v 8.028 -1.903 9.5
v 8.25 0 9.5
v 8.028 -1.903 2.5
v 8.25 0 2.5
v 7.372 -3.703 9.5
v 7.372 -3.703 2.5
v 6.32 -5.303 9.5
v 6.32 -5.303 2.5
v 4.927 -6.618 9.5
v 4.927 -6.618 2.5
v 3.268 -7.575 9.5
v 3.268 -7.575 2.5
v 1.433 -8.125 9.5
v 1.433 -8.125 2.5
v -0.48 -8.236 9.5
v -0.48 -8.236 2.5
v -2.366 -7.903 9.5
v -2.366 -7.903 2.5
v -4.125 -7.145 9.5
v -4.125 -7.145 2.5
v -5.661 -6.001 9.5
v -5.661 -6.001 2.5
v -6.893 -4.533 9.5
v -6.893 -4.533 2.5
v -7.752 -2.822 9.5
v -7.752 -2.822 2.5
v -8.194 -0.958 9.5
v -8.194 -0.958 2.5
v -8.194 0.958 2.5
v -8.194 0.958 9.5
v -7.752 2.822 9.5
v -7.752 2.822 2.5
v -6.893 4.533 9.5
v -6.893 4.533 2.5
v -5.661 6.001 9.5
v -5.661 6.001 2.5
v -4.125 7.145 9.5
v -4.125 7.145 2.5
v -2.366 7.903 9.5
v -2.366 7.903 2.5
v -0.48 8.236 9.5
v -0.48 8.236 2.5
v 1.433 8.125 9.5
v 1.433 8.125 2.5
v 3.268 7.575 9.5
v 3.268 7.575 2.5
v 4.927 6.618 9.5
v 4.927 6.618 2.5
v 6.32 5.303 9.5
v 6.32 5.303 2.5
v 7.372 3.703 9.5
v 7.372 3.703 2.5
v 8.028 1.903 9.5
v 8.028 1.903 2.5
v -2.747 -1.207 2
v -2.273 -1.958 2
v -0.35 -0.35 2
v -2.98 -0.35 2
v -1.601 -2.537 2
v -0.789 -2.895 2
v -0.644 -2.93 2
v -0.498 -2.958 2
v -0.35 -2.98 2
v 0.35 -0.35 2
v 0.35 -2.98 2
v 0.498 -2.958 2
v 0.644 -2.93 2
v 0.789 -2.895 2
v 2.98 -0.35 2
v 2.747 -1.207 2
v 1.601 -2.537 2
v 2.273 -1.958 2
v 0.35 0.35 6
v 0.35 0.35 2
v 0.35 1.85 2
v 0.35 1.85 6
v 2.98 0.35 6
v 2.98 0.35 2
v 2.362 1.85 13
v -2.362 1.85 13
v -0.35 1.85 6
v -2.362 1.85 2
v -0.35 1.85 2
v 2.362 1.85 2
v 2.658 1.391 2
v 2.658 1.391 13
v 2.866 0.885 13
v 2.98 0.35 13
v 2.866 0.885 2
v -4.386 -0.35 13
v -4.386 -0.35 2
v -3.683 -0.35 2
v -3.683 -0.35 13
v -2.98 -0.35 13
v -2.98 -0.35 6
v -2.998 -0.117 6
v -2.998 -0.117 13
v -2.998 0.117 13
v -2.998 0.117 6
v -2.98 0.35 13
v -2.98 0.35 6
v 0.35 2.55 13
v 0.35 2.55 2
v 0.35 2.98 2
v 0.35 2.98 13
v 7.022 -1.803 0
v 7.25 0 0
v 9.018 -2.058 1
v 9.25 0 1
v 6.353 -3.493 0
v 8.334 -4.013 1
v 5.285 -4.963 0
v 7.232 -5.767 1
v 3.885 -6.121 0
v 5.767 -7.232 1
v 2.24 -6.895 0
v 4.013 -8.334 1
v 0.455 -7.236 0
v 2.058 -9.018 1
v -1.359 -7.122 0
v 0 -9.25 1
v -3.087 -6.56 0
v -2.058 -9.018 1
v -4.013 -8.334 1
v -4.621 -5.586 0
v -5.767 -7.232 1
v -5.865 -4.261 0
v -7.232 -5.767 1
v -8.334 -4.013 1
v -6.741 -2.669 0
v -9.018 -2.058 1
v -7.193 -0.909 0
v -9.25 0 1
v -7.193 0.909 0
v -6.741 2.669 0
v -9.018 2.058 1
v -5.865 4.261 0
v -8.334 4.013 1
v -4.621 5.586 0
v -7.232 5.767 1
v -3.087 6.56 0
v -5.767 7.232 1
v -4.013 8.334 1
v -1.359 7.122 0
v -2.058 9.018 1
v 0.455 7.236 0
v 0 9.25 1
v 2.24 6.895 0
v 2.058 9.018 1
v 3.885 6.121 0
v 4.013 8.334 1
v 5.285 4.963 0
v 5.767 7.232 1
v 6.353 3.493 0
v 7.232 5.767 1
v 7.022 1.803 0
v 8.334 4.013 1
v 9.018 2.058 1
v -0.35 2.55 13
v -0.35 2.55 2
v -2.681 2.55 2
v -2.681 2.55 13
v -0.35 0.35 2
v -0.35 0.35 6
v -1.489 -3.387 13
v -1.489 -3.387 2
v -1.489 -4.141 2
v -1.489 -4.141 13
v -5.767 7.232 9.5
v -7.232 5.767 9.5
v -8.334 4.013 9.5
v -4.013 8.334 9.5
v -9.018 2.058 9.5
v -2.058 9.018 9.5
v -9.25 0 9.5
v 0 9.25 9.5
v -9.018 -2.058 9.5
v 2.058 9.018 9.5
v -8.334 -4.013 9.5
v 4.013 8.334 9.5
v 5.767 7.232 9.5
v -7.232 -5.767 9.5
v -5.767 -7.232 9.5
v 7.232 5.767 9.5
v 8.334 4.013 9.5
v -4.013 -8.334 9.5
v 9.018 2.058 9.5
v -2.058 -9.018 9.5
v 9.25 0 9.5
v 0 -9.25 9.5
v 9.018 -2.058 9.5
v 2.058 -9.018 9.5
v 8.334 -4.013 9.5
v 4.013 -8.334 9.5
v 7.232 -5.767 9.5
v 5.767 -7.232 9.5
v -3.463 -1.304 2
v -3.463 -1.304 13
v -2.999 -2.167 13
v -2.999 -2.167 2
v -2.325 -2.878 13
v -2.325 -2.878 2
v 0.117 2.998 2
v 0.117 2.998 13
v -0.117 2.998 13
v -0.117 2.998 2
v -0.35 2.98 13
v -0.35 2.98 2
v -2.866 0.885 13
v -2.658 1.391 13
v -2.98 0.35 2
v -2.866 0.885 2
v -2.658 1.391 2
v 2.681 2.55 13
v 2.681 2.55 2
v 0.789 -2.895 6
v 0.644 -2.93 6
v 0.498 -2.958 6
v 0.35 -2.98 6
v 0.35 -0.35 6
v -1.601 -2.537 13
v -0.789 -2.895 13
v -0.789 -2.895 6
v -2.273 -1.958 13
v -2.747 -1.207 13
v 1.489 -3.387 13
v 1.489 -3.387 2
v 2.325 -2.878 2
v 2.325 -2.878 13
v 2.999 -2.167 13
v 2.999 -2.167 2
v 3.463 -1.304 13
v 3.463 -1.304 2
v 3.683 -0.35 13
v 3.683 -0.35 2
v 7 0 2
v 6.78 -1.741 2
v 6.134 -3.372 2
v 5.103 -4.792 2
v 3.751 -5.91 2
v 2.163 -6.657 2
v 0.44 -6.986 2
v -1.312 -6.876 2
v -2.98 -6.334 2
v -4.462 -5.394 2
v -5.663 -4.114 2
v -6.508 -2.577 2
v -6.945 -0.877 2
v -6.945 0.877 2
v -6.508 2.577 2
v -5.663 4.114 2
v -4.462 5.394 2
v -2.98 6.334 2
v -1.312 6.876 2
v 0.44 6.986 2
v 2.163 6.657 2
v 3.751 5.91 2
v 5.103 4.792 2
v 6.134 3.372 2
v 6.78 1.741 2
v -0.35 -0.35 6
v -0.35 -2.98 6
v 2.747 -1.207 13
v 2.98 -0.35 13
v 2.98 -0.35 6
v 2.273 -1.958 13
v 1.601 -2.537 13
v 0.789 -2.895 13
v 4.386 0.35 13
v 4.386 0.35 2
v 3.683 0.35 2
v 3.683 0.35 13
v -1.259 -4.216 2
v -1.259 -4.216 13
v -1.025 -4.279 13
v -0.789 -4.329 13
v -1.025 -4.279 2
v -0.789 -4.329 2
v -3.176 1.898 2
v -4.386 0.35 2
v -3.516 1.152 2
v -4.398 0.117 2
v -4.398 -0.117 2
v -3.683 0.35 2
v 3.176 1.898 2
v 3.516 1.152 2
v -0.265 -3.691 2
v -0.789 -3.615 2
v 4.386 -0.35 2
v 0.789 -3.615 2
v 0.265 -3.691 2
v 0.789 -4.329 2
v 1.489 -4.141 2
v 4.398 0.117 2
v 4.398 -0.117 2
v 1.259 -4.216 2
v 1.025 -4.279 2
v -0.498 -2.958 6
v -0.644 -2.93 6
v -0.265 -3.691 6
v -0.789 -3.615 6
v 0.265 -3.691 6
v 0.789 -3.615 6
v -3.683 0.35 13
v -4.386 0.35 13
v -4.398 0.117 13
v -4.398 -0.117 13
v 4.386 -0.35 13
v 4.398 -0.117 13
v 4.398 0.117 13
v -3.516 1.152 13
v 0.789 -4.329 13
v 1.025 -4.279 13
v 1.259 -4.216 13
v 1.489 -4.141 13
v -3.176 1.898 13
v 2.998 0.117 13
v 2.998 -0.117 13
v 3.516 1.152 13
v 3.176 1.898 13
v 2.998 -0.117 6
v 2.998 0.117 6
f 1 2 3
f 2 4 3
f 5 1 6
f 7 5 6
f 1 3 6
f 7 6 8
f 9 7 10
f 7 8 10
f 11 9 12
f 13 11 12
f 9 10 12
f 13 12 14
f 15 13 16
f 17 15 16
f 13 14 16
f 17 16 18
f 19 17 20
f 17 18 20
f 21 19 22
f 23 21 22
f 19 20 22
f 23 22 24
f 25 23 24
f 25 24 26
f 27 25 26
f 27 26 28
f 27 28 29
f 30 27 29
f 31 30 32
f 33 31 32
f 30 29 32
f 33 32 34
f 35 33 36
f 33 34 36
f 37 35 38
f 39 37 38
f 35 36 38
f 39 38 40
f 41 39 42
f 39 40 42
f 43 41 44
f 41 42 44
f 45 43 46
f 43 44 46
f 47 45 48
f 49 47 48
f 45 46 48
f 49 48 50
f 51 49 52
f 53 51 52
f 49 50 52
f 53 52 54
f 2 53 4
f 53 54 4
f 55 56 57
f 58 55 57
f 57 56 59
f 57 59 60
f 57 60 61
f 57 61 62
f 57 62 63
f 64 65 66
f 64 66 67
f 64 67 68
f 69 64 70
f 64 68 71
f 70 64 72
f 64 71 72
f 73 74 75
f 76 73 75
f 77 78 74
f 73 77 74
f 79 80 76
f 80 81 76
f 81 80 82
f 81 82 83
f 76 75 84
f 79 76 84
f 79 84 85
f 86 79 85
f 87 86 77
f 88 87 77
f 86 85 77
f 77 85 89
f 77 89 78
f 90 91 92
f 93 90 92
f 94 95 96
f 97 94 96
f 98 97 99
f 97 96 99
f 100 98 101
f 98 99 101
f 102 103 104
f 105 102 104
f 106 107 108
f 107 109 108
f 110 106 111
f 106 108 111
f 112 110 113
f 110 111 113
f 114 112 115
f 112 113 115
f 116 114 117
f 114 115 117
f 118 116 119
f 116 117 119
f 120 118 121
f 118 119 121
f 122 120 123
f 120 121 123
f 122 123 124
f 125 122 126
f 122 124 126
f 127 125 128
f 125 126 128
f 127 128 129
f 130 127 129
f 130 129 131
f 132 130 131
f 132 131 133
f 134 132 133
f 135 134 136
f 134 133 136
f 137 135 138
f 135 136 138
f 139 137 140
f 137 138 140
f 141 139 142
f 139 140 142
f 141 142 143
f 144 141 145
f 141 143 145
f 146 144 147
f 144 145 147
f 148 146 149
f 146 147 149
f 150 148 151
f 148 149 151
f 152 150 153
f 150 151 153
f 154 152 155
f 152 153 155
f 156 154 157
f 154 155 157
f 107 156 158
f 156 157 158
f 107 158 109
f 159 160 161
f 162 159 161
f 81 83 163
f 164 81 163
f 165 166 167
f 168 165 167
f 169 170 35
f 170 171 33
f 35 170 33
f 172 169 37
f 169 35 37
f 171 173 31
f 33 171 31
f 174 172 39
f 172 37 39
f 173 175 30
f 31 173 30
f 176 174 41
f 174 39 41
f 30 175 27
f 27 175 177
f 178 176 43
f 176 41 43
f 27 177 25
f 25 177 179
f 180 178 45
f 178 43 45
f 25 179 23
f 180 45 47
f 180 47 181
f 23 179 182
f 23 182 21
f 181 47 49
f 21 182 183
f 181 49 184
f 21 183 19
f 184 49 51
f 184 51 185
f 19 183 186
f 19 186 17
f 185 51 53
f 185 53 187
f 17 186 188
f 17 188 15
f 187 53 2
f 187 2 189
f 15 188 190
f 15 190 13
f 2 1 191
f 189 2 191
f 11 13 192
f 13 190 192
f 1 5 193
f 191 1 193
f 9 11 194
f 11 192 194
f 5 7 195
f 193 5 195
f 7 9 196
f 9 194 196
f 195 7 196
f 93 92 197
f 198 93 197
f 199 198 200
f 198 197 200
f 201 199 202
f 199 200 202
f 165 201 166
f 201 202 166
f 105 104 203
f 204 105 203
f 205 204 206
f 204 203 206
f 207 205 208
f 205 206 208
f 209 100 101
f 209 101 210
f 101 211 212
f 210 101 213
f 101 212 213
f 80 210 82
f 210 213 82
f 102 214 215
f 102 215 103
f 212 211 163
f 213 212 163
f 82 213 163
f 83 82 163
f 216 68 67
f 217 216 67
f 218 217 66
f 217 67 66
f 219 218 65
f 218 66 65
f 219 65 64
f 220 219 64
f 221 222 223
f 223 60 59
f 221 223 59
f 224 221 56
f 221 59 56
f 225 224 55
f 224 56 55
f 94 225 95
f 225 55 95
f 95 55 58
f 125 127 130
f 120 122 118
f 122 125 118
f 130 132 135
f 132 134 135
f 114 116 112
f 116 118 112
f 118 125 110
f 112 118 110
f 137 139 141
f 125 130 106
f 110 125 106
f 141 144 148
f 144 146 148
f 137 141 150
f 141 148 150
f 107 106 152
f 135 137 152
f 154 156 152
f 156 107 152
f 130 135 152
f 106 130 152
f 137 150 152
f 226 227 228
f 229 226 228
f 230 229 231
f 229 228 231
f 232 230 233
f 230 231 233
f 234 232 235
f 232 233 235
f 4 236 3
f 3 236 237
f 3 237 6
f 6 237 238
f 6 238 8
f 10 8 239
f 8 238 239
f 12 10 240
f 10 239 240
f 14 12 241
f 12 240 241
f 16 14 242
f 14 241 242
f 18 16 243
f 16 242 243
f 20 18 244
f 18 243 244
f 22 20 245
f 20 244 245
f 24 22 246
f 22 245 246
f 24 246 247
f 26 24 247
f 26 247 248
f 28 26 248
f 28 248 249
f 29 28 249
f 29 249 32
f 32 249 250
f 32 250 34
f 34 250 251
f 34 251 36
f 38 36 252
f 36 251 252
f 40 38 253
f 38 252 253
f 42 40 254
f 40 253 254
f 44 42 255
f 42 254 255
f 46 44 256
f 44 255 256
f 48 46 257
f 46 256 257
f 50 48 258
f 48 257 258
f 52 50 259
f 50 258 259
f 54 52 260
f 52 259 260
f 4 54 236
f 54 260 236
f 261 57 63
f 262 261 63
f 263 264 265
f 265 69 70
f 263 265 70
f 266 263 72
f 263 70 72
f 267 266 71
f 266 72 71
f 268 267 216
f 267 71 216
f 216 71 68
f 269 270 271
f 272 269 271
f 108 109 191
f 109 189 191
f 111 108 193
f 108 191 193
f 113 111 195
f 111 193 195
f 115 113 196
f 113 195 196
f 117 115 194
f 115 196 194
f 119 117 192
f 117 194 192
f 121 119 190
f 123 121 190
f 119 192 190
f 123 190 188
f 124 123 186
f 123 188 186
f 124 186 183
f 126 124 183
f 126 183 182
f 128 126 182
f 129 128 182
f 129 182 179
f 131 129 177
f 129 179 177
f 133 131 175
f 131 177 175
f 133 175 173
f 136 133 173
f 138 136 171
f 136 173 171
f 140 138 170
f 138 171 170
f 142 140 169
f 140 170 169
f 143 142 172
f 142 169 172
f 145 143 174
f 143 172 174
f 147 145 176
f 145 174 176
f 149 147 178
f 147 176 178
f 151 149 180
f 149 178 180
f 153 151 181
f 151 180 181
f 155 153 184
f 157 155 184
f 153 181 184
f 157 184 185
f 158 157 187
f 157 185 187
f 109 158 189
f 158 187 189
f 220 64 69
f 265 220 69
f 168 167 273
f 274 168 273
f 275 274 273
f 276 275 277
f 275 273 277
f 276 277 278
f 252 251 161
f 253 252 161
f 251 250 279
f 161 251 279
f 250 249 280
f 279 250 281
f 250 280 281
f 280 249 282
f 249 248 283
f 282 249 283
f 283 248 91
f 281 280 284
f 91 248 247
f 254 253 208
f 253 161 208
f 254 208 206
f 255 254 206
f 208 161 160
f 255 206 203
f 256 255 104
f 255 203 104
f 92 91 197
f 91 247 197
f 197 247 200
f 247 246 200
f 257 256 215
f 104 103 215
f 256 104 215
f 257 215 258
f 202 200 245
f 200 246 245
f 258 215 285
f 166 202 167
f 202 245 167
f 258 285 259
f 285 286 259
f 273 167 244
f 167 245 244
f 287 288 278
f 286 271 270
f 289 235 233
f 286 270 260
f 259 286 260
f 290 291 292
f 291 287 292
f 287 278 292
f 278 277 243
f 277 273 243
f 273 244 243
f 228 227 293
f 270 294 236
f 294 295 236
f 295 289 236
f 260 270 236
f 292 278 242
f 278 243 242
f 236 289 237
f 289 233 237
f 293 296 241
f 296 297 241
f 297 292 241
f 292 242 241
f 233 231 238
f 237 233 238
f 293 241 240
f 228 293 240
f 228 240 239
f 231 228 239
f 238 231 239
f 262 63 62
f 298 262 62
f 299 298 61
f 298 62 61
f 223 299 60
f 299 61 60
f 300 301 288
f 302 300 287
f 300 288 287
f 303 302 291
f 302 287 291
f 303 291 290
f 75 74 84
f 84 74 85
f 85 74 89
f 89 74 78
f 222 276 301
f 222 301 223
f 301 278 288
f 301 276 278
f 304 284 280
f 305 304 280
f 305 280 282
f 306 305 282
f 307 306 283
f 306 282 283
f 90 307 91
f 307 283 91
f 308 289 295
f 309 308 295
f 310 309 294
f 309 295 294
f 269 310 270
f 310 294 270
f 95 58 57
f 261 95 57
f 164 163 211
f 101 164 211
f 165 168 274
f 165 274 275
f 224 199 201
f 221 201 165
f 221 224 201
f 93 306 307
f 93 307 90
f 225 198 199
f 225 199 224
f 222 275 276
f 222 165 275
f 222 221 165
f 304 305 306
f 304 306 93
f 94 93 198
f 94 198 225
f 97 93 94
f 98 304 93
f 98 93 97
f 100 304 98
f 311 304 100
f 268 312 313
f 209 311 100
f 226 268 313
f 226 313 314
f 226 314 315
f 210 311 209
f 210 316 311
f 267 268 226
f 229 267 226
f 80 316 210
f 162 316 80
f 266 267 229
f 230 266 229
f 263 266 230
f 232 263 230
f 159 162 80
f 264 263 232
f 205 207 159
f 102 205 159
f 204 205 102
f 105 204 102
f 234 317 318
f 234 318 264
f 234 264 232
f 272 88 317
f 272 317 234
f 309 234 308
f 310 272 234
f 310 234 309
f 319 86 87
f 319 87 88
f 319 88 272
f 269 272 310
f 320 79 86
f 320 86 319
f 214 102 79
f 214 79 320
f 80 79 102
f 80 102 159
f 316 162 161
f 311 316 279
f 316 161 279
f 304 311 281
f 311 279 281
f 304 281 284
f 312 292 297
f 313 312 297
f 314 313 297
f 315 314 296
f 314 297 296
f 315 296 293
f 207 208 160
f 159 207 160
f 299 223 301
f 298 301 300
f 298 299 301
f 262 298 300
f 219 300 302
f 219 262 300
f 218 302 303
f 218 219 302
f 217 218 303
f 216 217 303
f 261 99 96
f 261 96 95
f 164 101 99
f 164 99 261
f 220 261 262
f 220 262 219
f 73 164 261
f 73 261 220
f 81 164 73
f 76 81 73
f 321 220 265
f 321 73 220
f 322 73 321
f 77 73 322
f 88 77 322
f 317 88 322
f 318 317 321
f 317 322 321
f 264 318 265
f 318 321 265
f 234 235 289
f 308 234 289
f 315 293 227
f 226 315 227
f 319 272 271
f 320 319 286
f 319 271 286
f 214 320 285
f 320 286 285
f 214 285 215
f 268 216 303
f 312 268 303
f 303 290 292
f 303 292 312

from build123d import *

# Parameters (mm, degrees)
F2_W     = 0.7
F2_H     = 0.7
F3_DEPTH = 13
F4_DEPTH = 6


with BuildPart() as f1:
    # F0 (on Front) → F1 (revolve)
    with BuildSketch(Plane.XZ):
        Polygon((0, 2), (0, 0), (7.25, 0), (9.25, 1), (9.25, 9.5), (8.25, 9.5), (8.25, 2.5), (7, 2), align=None)
    revolve(axis=Axis((0, 0, -0.2857148442), (0, 0, -1)))

    # F2 (on Top) → F3 (join)
    with BuildSketch(Plane.XY):
        with BuildLine():
            Line((-2.9795133831, -0.35), (-3.6834087473, -0.35))
            ThreePointArc((-3.6834087473, -0.35), (-2.9989376836, -2.1671116191), (-1.4885221007, -3.3873739026))
            Line((-1.4885221007, -3.3873739026), (-1.4885221007, -4.1405678301))
            ThreePointArc((-1.4885221007, -4.1405678301), (-1.1424042215, -4.2491072703), (-0.7885221007, -4.3287680576))
            Line((-0.7885221007, -4.3287680576), (-0.7885221007, -3.6150010922))
            Line((-0.7885221007, -3.6150010922), (-0.7885221007, -2.8945177313))
            ThreePointArc((-0.7885221007, -2.8945177313), (-2.2733599524, -1.9575072227), (-2.9795133831, -0.35))
        make_face()
        with BuildLine():
            Line((-0.35, 1.85), (-0.35, 2.55))
            Line((-0.35, 2.55), (-2.6809513237, 2.55))
            ThreePointArc((-2.6809513237, 2.55), (-3.366937745, 1.5341871534), (-3.6834087473, 0.35))
            Line((-3.6834087473, 0.35), (-2.9795133831, 0.35))
            ThreePointArc((-2.9795133831, 0.35), (-2.7739084983, 1.1425548752), (-2.3616731357, 1.85))
            Line((-2.3616731357, 1.85), (-0.35, 1.85))
        make_face()
        with BuildLine():
            Line((2.6809513237, 2.55), (0.35, 2.55))
            Line((0.35, 2.55), (0.35, 1.85))
            Line((0.35, 1.85), (2.3616731357, 1.85))
            ThreePointArc((2.3616731357, 1.85), (2.7739084983, 1.1425548752), (2.9795133831, 0.35))
            Line((2.9795133831, 0.35), (3.6834087473, 0.35))
            ThreePointArc((3.6834087473, 0.35), (3.366937745, 1.5341871534), (2.6809513237, 2.55))
        make_face()
        with BuildLine():
            ThreePointArc((3.6834087473, -0.35), (3.7, 0), (3.6834087473, 0.35))
            Line((3.6834087473, 0.35), (2.9795133831, 0.35))
            ThreePointArc((2.9795133831, 0.35), (3, 0), (2.9795133831, -0.35))
            Line((2.9795133831, -0.35), (3.6834087473, -0.35))
        make_face()
        with Locations((0, 2.2)):
            Rectangle(F2_W, F2_H)
        with BuildLine():
            Line((-2.9795133831, 0.35), (-3.6834087473, 0.35))
            ThreePointArc((-3.6834087473, 0.35), (-3.7, 0), (-3.6834087473, -0.35))
            Line((-3.6834087473, -0.35), (-2.9795133831, -0.35))
            ThreePointArc((-2.9795133831, -0.35), (-3, 0), (-2.9795133831, 0.35))
        make_face()
        with BuildLine():
            ThreePointArc((1.4885221007, -3.3873739026), (2.9989376836, -2.1671116191), (3.6834087473, -0.35))
            Line((3.6834087473, -0.35), (2.9795133831, -0.35))
            ThreePointArc((2.9795133831, -0.35), (2.2733599524, -1.9575072227), (0.7885221007, -2.8945177313))
            Line((0.7885221007, -2.8945177313), (0.7885221007, -3.6150010922))
            Line((0.7885221007, -3.6150010922), (0.7885221007, -4.3287680576))
            ThreePointArc((0.7885221007, -4.3287680576), (1.1424042215, -4.2491072703), (1.4885221007, -4.1405678301))
            Line((1.4885221007, -4.1405678301), (1.4885221007, -3.3873739026))
        make_face()
        with BuildLine():
            ThreePointArc((-3.6834087473, -0.35), (-3.7, 0), (-3.6834087473, 0.35))
            Line((-3.6834087473, 0.35), (-4.3860574552, 0.35))
            ThreePointArc((-4.3860574552, 0.35), (-4.4, 0), (-4.3860574552, -0.35))
            Line((-4.3860574552, -0.35), (-3.6834087473, -0.35))
        make_face()
        with BuildLine():
            Line((0.35, 2.55), (0.35, 2.9795133831))
            ThreePointArc((0.35, 2.9795133831), (0, 3), (-0.35, 2.9795133831))
            Line((-0.35, 2.9795133831), (-0.35, 2.55))
            Line((-0.35, 2.55), (0.35, 2.55))
        make_face()
        with BuildLine():
            Line((4.3860574552, 0.35), (3.6834087473, 0.35))
            ThreePointArc((3.6834087473, 0.35), (3.7, 0), (3.6834087473, -0.35))
            Line((3.6834087473, -0.35), (4.3860574552, -0.35))
            ThreePointArc((4.3860574552, -0.35), (4.4, 0), (4.3860574552, 0.35))
        make_face()
    extrude(amount=F3_DEPTH)

    # F2 (on Top) → F4 (join)
    with BuildSketch(Plane.XY):
        with BuildLine():
            Line((0.35, 0.35), (0.35, 1.85))
            Line((0.35, 1.85), (-0.35, 1.85))
            Line((-0.35, 1.85), (-0.35, 0.35))
            Line((-0.35, 0.35), (-2.9795133831, 0.35))
            ThreePointArc((-2.9795133831, 0.35), (-3, 0), (-2.9795133831, -0.35))
            Line((-2.9795133831, -0.35), (-0.35, -0.35))
            Line((-0.35, -0.35), (-0.35, -2.9795133831))
            ThreePointArc((-0.35, -2.9795133831), (-0.5708451705, -2.9451885833), (-0.7885221007, -2.8945177313))
            Line((-0.7885221007, -2.8945177313), (-0.7885221007, -3.6150010922))
            ThreePointArc((-0.7885221007, -3.6150010922), (0, -3.7), (0.7885221007, -3.6150010922))
            Line((0.7885221007, -3.6150010922), (0.7885221007, -2.8945177313))
            ThreePointArc((0.7885221007, -2.8945177313), (0.5708451705, -2.9451885833), (0.35, -2.9795133831))
            Line((0.35, -2.9795133831), (0.35, -0.35))
            Line((0.35, -0.35), (2.9795133831, -0.35))
            ThreePointArc((2.9795133831, -0.35), (3, 0), (2.9795133831, 0.35))
            Line((2.9795133831, 0.35), (0.35, 0.35))
        make_face()
    extrude(amount=F4_DEPTH)


solid = f1.part
